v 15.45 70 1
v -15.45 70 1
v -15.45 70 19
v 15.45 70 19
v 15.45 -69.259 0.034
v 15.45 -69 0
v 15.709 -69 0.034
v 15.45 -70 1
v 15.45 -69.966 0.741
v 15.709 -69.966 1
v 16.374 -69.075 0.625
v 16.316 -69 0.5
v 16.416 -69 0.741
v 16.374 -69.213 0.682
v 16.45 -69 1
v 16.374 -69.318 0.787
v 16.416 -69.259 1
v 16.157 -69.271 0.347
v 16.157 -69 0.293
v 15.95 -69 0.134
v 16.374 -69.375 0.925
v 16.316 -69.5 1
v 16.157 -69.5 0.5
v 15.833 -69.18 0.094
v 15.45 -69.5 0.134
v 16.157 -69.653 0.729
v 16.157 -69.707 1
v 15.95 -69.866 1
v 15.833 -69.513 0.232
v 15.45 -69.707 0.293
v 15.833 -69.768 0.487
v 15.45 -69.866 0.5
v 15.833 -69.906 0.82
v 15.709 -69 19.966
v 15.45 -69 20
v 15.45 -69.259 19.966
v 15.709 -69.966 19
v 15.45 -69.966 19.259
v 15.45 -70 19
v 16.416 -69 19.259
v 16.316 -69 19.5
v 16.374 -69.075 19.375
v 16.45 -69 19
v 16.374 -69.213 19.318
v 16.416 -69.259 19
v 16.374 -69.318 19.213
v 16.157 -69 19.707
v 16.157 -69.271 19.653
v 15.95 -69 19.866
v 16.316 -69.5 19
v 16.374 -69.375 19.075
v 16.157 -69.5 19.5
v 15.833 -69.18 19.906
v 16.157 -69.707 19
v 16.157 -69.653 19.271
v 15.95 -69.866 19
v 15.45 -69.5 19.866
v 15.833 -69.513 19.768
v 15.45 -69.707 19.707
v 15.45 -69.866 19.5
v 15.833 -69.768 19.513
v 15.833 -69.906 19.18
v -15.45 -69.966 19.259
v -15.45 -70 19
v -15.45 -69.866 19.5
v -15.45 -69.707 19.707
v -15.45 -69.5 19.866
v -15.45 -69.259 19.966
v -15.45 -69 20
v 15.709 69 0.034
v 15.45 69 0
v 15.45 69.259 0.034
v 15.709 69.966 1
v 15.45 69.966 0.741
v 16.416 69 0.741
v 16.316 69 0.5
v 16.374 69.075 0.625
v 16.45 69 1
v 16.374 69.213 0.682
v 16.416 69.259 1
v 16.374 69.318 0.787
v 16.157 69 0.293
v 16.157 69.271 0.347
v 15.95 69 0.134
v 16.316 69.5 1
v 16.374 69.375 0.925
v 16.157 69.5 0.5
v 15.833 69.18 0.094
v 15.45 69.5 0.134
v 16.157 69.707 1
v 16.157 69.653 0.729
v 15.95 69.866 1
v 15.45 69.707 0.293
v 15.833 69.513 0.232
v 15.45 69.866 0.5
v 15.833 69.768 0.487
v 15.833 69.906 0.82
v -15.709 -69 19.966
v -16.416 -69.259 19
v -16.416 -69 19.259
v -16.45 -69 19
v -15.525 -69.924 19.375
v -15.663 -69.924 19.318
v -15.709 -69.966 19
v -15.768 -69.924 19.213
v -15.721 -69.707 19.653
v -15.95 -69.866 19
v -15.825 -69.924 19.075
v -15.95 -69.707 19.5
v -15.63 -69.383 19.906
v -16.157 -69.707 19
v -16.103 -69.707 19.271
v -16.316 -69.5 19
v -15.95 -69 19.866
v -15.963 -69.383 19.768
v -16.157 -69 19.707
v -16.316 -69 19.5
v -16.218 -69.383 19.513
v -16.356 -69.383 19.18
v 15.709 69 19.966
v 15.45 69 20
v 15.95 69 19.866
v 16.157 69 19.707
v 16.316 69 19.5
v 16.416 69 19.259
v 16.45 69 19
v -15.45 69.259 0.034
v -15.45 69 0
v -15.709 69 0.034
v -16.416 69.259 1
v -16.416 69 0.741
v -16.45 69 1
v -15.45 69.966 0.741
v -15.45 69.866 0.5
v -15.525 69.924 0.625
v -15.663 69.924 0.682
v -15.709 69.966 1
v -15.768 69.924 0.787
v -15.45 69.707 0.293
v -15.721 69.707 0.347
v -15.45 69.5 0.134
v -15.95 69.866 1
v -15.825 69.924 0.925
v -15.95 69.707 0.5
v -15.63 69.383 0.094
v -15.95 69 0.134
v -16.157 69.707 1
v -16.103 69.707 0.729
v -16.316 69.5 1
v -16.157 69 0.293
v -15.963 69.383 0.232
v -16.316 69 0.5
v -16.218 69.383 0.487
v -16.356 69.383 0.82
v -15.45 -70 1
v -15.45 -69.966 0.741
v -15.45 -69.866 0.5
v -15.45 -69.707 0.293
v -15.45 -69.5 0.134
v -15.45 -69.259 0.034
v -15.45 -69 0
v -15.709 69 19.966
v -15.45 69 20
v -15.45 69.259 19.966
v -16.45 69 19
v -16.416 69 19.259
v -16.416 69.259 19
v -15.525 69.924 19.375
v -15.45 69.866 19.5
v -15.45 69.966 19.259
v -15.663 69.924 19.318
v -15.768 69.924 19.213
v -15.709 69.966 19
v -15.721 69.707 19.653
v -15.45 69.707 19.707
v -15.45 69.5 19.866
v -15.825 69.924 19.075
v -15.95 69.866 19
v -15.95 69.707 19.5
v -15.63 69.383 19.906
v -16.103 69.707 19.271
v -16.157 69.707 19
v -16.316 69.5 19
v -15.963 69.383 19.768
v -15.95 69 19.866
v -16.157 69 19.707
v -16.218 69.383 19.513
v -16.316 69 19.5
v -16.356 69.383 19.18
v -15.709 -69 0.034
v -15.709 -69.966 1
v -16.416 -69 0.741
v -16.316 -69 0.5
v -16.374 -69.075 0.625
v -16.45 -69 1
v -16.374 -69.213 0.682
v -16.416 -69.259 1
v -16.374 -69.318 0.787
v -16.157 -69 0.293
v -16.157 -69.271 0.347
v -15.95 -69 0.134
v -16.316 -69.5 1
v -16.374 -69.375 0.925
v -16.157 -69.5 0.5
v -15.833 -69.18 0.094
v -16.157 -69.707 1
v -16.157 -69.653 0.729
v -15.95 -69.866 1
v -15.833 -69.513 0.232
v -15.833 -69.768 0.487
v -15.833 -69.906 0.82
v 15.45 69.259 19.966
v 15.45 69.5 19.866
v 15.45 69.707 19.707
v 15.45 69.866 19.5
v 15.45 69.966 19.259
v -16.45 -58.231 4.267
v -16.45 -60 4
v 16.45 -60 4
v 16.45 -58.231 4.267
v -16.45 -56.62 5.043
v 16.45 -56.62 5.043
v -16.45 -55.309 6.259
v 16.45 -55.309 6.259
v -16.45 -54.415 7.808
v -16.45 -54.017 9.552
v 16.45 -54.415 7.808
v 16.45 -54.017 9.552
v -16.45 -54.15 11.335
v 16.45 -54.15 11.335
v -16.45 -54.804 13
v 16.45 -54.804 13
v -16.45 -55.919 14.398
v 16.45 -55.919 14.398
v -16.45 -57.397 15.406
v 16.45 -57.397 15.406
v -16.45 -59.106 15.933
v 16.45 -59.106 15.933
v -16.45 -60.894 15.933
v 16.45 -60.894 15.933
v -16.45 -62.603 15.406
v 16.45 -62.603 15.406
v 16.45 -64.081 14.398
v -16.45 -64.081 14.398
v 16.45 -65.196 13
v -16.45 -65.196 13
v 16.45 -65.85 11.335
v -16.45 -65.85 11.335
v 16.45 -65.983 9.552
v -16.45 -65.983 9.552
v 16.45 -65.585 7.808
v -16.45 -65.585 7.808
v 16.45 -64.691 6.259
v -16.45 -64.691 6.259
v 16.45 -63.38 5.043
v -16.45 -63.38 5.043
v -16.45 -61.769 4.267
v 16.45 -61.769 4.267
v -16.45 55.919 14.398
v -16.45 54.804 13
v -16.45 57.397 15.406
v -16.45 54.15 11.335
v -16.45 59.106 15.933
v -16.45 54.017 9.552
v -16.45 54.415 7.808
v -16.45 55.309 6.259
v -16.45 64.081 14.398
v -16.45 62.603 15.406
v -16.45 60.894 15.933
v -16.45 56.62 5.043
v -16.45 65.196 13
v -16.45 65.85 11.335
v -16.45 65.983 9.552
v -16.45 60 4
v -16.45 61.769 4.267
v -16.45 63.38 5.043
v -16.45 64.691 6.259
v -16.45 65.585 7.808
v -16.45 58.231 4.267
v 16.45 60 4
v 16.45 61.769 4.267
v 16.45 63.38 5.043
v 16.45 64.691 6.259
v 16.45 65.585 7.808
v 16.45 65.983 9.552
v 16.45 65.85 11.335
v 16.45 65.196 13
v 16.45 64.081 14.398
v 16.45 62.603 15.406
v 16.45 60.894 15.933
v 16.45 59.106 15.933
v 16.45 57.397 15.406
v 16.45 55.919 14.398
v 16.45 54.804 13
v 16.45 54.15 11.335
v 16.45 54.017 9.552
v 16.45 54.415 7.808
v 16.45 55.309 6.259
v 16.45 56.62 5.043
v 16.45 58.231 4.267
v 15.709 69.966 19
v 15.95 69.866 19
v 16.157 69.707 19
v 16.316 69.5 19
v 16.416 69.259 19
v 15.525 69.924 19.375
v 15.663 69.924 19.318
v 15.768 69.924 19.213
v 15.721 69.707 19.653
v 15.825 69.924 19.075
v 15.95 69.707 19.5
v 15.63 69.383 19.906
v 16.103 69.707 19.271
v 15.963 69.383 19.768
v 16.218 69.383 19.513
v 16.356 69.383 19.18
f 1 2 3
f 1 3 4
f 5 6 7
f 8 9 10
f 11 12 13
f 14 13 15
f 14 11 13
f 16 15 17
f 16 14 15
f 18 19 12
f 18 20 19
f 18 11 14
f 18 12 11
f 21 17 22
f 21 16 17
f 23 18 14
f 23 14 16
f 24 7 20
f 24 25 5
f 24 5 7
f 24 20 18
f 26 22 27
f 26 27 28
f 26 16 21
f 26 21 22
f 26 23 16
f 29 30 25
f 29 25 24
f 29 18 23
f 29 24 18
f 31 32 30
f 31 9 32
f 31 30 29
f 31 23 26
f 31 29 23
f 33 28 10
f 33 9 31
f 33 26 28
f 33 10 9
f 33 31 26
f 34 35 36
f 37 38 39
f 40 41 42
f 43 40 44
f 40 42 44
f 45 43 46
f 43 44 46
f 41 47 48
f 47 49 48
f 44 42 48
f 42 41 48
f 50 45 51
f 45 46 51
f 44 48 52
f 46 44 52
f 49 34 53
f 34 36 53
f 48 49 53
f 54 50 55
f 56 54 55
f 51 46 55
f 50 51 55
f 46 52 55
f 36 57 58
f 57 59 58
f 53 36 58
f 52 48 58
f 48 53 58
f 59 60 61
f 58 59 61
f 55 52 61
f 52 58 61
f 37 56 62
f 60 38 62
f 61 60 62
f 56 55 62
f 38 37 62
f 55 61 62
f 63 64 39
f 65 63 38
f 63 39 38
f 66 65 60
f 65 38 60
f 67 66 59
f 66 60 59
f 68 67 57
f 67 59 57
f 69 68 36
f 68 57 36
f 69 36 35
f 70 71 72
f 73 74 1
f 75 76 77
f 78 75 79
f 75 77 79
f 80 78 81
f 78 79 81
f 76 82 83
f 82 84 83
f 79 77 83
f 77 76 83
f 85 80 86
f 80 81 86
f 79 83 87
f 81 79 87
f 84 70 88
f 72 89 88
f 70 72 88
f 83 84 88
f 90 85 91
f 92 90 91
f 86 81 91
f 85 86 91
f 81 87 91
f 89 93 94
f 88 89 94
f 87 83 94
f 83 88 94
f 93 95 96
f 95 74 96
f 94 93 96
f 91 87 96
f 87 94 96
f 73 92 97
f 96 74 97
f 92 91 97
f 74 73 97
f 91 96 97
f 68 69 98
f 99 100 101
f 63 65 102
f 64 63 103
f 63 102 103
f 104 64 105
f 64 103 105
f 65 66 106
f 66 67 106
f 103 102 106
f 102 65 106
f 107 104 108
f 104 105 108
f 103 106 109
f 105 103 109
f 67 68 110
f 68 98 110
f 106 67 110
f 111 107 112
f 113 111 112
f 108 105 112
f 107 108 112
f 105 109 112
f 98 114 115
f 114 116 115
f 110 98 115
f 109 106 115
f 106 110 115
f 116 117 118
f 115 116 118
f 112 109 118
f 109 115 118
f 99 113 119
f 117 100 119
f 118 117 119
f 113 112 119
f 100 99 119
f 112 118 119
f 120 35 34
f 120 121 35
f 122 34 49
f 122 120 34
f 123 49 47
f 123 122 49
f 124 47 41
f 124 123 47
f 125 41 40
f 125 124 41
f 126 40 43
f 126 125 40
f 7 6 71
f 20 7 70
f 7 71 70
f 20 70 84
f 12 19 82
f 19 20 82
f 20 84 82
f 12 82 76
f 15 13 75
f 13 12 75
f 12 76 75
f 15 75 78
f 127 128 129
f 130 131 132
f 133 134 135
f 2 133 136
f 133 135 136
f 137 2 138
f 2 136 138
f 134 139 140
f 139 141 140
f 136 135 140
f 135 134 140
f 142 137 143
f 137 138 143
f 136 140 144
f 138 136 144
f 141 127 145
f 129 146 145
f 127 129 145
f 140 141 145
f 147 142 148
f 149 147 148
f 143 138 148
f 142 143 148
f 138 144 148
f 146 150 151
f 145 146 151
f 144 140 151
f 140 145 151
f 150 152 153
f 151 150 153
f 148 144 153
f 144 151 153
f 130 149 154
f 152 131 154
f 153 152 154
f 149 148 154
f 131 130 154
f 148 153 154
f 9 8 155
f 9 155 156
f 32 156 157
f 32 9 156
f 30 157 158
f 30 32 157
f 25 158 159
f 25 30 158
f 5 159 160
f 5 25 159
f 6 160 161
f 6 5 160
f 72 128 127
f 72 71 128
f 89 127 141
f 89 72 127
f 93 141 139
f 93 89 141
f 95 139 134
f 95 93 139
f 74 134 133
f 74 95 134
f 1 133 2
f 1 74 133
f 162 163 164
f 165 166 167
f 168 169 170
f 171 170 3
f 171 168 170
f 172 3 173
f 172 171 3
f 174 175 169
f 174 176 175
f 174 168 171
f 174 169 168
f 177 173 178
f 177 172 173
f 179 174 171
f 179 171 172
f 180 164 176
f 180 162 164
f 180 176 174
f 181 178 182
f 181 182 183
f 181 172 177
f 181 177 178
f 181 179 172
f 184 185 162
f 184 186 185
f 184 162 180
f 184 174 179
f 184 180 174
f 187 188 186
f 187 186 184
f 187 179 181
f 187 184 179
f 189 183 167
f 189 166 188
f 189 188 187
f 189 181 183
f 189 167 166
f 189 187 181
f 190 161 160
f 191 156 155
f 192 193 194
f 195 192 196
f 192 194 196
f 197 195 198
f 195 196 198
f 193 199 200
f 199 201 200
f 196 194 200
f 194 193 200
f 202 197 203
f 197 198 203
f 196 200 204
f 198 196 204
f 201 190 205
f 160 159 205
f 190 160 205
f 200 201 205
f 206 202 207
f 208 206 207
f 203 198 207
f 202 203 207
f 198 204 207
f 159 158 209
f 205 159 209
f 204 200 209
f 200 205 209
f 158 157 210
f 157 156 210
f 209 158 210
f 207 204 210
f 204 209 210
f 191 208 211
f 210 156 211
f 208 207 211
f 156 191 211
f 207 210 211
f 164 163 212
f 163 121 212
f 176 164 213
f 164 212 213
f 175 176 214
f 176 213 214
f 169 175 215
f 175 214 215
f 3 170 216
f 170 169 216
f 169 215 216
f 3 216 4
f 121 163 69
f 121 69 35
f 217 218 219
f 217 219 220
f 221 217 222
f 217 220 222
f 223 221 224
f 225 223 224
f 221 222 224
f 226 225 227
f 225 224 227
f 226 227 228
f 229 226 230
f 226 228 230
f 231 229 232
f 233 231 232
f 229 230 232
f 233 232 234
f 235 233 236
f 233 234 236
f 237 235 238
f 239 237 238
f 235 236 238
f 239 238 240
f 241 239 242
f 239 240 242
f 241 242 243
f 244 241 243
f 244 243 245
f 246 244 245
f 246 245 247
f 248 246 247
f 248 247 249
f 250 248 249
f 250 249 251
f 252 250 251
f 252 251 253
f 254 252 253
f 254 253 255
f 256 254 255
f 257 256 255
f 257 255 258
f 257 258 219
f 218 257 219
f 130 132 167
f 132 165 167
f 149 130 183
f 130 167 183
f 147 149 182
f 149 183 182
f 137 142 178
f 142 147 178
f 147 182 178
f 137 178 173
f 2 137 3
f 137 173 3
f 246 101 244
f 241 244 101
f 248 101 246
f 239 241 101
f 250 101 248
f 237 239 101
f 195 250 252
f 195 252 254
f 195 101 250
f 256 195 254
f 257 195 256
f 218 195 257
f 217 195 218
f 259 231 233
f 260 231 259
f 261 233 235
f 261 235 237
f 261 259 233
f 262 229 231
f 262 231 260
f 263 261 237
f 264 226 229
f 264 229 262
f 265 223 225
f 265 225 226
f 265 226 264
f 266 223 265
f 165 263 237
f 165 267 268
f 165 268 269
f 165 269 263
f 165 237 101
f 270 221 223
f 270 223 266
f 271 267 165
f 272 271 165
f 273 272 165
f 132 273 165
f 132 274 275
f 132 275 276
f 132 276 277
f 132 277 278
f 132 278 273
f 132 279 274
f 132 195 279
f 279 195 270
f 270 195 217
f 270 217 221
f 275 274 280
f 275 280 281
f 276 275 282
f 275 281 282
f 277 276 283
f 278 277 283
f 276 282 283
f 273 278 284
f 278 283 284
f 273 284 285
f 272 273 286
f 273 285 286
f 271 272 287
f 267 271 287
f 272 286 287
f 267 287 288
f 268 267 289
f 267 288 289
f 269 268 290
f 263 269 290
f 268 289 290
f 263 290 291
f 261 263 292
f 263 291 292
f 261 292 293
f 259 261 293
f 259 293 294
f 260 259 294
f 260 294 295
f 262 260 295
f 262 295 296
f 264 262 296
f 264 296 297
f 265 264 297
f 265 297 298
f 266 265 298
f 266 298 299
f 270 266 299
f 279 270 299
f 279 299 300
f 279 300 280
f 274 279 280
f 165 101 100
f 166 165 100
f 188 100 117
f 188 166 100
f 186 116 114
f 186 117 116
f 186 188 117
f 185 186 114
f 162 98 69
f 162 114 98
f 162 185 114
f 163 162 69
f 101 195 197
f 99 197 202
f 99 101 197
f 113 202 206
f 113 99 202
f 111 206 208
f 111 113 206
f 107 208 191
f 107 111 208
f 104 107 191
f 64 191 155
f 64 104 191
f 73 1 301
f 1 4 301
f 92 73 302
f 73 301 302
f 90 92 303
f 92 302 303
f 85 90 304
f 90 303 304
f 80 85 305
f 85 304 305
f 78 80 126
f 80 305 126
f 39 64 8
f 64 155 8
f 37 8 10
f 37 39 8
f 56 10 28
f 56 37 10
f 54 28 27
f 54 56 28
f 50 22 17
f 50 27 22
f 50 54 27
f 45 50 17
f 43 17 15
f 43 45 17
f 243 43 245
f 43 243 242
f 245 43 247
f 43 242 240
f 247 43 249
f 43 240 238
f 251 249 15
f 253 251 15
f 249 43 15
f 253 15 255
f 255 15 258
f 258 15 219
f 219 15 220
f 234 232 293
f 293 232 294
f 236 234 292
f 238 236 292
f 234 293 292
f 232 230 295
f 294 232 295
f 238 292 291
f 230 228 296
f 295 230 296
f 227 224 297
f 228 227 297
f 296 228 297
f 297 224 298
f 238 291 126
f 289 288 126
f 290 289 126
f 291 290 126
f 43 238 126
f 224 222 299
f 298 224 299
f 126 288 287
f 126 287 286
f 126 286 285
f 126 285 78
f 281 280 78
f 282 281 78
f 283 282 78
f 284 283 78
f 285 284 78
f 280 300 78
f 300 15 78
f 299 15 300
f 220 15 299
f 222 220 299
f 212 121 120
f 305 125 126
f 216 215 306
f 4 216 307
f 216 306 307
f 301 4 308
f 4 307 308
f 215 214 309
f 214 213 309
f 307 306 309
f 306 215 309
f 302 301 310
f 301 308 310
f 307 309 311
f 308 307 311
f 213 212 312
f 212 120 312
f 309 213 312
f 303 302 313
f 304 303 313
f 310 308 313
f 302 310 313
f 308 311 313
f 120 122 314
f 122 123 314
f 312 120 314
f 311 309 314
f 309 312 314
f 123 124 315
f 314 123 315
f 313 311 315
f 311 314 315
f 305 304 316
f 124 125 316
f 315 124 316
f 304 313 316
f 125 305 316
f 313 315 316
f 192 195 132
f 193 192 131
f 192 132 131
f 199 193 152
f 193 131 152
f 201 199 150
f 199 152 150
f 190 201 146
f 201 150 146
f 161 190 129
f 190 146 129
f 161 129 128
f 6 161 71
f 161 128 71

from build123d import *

# Parameters (mm, degrees)
SKETCH1_W           = 32.9
SKETCH1_H           = 140
BOSS_EXTRUDE1_DEPTH = 20
SKETCH3_R           = 6
CUT_EXTRUDE1_DEPTH  = 33.9
FILLET1_R           = 1


with BuildPart() as part:
    # Sketch1 → Boss-Extrude1 (new body)
    with BuildSketch(Plane.XY):
        Rectangle(SKETCH1_W, SKETCH1_H)
    extrude(amount=BOSS_EXTRUDE1_DEPTH)

    # Sketch3 → Cut-Extrude1 (cut, through all)
    with BuildSketch(Plane(origin=(16.45, 0, 0), x_dir=(0, 0, -1), z_dir=(1, 0, 0))):
        with Locations((-10, 60)):
            Circle(SKETCH3_R)
        with Locations((-10, -60)):
            Circle(SKETCH3_R)
    extrude(amount=-CUT_EXTRUDE1_DEPTH, mode=Mode.SUBTRACT)

    # Fillet1
    fillet1_edges = [part.edges().sort_by_distance(p)[0] for p in [
        (-16.45, 0, 20),
        (0, -70, 20),
        (16.45, 0, 20),
        (0, -70, 0),
        (-16.45, 0, 0),
        (0, 70, 0),
        (16.45, 0, 0),
        (0, 70, 20),
        (16.45, -70, 10),
        (-16.45, -70, 10),
        (-16.45, 70, 10),
        (16.45, 70, 10),
    ]]
    fillet(fillet1_edges, radius=FILLET1_R)


solid = part.part
